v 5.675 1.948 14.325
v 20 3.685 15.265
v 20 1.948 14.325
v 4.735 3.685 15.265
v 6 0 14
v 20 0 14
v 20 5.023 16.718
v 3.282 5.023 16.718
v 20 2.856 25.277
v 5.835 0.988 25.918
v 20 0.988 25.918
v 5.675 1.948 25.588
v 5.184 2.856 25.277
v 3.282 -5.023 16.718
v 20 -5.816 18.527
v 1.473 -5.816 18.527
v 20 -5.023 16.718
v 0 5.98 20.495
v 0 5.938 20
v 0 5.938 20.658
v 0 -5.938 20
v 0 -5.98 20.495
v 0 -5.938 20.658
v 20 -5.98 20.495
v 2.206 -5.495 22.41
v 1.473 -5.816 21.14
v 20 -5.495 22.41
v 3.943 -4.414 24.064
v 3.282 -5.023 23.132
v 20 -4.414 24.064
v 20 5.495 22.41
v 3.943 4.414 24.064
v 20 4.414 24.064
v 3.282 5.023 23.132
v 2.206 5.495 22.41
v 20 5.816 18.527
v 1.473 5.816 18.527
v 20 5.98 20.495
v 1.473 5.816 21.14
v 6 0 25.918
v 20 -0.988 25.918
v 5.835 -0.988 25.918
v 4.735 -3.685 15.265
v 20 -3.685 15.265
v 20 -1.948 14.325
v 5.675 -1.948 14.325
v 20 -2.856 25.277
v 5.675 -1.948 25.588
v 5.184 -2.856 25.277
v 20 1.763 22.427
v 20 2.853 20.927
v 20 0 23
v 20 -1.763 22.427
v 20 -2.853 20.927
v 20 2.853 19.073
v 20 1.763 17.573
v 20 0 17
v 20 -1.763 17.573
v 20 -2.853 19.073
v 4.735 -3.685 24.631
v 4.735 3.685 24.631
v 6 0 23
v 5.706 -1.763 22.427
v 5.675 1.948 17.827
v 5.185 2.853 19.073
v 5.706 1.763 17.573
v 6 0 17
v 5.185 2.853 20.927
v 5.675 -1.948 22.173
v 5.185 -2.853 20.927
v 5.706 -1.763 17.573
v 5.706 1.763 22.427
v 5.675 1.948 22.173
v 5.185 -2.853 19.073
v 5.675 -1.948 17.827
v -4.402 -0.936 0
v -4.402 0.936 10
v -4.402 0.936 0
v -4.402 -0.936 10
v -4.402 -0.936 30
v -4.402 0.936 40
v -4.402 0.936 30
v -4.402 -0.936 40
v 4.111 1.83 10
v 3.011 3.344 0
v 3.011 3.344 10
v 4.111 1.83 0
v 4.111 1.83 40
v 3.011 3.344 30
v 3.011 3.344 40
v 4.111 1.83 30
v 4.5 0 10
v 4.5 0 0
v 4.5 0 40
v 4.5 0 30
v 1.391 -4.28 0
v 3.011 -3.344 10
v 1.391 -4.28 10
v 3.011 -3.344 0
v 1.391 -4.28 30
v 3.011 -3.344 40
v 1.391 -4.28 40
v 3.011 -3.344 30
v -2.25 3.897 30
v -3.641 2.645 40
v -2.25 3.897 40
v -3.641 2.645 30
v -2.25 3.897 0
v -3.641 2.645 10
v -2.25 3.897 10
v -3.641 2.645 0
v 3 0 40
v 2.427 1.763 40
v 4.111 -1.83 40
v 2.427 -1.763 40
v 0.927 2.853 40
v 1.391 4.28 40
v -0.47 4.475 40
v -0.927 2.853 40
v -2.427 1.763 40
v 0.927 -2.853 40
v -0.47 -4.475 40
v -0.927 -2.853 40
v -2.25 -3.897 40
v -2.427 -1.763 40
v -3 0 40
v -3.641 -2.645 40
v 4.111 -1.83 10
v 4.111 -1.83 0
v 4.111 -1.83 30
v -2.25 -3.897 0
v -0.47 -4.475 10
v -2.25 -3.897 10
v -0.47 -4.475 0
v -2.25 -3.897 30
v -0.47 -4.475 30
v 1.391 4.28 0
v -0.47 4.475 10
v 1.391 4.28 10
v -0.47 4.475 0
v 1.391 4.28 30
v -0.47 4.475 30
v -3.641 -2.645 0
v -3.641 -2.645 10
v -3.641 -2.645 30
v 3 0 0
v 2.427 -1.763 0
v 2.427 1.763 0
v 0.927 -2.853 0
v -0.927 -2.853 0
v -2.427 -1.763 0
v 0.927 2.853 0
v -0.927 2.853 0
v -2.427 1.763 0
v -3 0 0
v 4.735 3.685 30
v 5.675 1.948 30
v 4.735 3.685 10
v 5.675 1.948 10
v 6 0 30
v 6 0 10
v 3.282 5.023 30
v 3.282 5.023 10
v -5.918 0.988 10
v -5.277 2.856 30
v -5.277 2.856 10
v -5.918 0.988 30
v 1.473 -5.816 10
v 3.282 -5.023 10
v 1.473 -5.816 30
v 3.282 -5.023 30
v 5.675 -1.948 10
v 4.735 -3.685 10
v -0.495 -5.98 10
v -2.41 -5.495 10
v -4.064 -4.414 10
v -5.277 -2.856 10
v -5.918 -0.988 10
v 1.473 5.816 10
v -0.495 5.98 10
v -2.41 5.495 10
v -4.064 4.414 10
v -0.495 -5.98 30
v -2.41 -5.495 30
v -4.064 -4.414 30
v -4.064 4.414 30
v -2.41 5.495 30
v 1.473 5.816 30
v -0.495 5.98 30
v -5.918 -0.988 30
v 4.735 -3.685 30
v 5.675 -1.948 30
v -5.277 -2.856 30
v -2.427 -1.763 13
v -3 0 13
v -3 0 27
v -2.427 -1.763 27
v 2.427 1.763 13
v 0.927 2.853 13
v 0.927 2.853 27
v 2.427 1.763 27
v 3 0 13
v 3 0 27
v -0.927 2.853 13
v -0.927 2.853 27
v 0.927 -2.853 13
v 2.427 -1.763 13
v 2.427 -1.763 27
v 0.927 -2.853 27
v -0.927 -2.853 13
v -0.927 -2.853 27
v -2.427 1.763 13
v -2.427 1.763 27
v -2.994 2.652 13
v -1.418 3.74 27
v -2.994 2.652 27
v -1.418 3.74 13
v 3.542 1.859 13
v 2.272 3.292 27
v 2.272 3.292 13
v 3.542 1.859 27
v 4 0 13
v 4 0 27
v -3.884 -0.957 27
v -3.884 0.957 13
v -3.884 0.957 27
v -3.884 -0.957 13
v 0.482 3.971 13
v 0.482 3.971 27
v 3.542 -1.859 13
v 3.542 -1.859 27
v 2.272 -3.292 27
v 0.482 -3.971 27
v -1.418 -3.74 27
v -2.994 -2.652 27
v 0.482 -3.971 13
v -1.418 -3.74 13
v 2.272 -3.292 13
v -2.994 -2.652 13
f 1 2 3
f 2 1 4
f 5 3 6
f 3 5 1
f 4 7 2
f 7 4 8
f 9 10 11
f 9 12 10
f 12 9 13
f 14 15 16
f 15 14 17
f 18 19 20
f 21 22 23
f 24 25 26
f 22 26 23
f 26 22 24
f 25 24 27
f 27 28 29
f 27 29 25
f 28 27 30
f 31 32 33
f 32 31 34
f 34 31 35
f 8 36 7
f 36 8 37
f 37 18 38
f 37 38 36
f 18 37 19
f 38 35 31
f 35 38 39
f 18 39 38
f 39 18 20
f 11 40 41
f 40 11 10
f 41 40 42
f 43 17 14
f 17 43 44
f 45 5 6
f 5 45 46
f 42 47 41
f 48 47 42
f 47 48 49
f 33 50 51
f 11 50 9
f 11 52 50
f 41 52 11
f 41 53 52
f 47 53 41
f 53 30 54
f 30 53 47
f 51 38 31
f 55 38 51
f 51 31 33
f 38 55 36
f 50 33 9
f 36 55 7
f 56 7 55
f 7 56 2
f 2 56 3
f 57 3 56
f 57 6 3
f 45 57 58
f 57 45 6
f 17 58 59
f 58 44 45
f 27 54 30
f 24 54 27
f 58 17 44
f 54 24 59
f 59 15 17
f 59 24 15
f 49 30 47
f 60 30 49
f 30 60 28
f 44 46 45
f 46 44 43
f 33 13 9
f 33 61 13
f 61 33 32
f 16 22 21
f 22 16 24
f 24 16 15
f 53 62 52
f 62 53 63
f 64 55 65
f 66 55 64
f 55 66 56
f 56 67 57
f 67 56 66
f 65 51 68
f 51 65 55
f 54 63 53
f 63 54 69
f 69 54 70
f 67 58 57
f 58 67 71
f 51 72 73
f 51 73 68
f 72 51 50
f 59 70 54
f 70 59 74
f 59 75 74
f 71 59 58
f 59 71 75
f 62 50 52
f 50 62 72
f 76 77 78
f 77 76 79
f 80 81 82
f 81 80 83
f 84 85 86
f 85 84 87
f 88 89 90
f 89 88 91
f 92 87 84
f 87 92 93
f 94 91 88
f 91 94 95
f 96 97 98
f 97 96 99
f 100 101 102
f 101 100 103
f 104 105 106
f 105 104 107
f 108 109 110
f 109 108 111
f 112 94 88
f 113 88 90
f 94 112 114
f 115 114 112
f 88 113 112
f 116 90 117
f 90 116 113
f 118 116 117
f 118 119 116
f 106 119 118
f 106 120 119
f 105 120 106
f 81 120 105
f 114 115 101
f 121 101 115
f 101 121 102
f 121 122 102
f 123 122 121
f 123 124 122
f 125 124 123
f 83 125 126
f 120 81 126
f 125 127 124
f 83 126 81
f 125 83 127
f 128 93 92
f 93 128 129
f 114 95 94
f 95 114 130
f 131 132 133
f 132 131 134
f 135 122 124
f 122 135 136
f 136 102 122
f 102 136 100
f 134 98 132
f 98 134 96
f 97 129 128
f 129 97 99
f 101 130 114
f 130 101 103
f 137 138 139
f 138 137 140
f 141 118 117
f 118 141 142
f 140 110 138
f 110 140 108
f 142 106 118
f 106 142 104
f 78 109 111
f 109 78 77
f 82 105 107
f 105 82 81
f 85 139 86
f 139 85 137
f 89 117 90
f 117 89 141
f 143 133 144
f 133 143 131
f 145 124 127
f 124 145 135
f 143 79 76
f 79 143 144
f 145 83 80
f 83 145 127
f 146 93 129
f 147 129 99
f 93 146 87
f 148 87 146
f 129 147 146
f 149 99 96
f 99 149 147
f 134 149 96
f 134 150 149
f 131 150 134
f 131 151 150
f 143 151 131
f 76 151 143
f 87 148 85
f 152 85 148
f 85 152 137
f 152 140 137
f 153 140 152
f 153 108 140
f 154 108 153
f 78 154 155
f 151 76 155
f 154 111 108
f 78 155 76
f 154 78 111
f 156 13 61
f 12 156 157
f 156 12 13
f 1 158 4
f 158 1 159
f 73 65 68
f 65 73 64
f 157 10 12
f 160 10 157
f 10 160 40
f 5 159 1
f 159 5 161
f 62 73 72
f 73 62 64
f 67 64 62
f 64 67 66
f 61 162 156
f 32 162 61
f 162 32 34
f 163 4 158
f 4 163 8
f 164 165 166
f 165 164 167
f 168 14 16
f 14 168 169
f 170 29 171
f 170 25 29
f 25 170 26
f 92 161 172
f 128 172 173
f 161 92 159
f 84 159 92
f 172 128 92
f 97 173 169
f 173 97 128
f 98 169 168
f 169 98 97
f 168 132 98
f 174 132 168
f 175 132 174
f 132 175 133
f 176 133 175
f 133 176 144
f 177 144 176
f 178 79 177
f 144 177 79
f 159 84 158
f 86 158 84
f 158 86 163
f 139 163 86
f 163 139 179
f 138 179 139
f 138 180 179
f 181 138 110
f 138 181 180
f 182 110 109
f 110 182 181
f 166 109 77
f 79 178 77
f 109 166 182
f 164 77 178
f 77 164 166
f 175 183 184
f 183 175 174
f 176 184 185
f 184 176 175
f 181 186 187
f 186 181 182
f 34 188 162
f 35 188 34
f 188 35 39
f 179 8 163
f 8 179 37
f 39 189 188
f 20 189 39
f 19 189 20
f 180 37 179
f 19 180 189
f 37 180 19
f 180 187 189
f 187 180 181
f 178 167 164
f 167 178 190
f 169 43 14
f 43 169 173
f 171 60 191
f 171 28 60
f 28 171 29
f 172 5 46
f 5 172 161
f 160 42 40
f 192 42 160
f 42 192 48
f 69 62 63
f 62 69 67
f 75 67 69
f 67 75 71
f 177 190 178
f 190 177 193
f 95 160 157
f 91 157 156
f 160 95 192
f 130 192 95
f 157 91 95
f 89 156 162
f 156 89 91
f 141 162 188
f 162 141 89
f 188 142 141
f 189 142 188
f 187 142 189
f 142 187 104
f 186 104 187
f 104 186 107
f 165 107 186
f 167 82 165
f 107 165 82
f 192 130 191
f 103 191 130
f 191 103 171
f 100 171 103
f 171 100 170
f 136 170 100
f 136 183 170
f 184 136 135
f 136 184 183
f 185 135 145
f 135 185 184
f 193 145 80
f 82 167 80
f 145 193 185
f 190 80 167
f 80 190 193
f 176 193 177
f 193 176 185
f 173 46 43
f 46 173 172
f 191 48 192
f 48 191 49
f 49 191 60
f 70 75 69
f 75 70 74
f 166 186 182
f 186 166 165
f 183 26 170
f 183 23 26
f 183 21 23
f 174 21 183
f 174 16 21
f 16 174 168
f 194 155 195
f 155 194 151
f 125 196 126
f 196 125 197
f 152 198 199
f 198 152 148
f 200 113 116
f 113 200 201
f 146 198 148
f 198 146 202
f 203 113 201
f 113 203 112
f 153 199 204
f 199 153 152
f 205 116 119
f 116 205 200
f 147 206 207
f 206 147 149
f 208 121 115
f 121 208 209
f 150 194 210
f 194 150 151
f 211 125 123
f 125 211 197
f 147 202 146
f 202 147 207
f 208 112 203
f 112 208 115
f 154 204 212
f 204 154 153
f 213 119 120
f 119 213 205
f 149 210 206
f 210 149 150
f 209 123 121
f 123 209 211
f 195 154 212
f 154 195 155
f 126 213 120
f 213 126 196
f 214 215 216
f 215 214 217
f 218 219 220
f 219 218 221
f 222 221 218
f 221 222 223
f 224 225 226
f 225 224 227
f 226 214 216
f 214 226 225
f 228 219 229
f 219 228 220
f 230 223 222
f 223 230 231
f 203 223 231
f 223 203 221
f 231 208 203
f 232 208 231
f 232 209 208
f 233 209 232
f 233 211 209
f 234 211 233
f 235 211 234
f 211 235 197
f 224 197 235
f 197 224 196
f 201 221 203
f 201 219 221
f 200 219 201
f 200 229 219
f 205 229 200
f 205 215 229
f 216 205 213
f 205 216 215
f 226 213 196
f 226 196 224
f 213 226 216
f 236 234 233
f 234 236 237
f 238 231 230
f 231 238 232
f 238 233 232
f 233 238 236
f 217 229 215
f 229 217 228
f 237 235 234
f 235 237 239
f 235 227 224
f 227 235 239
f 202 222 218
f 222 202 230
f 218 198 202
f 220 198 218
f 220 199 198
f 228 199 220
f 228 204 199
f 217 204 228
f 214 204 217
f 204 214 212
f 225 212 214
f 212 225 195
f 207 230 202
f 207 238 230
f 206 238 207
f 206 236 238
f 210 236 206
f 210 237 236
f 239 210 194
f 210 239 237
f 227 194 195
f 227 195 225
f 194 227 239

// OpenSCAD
// Outer pipe
r1 = 4.5;
// Pipe bore
r2 = 3.0;
// Sensor bore
r3 = 3.0;
// Thick pipe
r4 = 6;
// Inner space
r5 = 4;
// Length of each arm
h1 = 20;
// Length of sensor tap
h2 = 20;

difference()
{
  union()
  {
    // Vertical outer pipe
    cylinder(r = r1, h = h1*2);

    // Thick pipe
    translate([0, 0, h1/2]) 
    cylinder(r = r4, h = h1);

    // Horizontal pipe
    translate([0, 0, h1]) 
      rotate([0, 90, 0]) 
        difference()
        {
          // Outer pipe
          translate([0, 0, 0]) cylinder(r = r4, h = h2);
          // Bore
          translate([0, 0, 1]) cylinder(r = r3, h = h2);
        }
  }
  union()
  {
    // Vertical bore
    translate([0, 0, -1]) cylinder(r = r2, h = h1*2+2);
    translate([0, 0, h1-(h1-6)/2]) cylinder(r = r5, h = h1-6);
  }
}
